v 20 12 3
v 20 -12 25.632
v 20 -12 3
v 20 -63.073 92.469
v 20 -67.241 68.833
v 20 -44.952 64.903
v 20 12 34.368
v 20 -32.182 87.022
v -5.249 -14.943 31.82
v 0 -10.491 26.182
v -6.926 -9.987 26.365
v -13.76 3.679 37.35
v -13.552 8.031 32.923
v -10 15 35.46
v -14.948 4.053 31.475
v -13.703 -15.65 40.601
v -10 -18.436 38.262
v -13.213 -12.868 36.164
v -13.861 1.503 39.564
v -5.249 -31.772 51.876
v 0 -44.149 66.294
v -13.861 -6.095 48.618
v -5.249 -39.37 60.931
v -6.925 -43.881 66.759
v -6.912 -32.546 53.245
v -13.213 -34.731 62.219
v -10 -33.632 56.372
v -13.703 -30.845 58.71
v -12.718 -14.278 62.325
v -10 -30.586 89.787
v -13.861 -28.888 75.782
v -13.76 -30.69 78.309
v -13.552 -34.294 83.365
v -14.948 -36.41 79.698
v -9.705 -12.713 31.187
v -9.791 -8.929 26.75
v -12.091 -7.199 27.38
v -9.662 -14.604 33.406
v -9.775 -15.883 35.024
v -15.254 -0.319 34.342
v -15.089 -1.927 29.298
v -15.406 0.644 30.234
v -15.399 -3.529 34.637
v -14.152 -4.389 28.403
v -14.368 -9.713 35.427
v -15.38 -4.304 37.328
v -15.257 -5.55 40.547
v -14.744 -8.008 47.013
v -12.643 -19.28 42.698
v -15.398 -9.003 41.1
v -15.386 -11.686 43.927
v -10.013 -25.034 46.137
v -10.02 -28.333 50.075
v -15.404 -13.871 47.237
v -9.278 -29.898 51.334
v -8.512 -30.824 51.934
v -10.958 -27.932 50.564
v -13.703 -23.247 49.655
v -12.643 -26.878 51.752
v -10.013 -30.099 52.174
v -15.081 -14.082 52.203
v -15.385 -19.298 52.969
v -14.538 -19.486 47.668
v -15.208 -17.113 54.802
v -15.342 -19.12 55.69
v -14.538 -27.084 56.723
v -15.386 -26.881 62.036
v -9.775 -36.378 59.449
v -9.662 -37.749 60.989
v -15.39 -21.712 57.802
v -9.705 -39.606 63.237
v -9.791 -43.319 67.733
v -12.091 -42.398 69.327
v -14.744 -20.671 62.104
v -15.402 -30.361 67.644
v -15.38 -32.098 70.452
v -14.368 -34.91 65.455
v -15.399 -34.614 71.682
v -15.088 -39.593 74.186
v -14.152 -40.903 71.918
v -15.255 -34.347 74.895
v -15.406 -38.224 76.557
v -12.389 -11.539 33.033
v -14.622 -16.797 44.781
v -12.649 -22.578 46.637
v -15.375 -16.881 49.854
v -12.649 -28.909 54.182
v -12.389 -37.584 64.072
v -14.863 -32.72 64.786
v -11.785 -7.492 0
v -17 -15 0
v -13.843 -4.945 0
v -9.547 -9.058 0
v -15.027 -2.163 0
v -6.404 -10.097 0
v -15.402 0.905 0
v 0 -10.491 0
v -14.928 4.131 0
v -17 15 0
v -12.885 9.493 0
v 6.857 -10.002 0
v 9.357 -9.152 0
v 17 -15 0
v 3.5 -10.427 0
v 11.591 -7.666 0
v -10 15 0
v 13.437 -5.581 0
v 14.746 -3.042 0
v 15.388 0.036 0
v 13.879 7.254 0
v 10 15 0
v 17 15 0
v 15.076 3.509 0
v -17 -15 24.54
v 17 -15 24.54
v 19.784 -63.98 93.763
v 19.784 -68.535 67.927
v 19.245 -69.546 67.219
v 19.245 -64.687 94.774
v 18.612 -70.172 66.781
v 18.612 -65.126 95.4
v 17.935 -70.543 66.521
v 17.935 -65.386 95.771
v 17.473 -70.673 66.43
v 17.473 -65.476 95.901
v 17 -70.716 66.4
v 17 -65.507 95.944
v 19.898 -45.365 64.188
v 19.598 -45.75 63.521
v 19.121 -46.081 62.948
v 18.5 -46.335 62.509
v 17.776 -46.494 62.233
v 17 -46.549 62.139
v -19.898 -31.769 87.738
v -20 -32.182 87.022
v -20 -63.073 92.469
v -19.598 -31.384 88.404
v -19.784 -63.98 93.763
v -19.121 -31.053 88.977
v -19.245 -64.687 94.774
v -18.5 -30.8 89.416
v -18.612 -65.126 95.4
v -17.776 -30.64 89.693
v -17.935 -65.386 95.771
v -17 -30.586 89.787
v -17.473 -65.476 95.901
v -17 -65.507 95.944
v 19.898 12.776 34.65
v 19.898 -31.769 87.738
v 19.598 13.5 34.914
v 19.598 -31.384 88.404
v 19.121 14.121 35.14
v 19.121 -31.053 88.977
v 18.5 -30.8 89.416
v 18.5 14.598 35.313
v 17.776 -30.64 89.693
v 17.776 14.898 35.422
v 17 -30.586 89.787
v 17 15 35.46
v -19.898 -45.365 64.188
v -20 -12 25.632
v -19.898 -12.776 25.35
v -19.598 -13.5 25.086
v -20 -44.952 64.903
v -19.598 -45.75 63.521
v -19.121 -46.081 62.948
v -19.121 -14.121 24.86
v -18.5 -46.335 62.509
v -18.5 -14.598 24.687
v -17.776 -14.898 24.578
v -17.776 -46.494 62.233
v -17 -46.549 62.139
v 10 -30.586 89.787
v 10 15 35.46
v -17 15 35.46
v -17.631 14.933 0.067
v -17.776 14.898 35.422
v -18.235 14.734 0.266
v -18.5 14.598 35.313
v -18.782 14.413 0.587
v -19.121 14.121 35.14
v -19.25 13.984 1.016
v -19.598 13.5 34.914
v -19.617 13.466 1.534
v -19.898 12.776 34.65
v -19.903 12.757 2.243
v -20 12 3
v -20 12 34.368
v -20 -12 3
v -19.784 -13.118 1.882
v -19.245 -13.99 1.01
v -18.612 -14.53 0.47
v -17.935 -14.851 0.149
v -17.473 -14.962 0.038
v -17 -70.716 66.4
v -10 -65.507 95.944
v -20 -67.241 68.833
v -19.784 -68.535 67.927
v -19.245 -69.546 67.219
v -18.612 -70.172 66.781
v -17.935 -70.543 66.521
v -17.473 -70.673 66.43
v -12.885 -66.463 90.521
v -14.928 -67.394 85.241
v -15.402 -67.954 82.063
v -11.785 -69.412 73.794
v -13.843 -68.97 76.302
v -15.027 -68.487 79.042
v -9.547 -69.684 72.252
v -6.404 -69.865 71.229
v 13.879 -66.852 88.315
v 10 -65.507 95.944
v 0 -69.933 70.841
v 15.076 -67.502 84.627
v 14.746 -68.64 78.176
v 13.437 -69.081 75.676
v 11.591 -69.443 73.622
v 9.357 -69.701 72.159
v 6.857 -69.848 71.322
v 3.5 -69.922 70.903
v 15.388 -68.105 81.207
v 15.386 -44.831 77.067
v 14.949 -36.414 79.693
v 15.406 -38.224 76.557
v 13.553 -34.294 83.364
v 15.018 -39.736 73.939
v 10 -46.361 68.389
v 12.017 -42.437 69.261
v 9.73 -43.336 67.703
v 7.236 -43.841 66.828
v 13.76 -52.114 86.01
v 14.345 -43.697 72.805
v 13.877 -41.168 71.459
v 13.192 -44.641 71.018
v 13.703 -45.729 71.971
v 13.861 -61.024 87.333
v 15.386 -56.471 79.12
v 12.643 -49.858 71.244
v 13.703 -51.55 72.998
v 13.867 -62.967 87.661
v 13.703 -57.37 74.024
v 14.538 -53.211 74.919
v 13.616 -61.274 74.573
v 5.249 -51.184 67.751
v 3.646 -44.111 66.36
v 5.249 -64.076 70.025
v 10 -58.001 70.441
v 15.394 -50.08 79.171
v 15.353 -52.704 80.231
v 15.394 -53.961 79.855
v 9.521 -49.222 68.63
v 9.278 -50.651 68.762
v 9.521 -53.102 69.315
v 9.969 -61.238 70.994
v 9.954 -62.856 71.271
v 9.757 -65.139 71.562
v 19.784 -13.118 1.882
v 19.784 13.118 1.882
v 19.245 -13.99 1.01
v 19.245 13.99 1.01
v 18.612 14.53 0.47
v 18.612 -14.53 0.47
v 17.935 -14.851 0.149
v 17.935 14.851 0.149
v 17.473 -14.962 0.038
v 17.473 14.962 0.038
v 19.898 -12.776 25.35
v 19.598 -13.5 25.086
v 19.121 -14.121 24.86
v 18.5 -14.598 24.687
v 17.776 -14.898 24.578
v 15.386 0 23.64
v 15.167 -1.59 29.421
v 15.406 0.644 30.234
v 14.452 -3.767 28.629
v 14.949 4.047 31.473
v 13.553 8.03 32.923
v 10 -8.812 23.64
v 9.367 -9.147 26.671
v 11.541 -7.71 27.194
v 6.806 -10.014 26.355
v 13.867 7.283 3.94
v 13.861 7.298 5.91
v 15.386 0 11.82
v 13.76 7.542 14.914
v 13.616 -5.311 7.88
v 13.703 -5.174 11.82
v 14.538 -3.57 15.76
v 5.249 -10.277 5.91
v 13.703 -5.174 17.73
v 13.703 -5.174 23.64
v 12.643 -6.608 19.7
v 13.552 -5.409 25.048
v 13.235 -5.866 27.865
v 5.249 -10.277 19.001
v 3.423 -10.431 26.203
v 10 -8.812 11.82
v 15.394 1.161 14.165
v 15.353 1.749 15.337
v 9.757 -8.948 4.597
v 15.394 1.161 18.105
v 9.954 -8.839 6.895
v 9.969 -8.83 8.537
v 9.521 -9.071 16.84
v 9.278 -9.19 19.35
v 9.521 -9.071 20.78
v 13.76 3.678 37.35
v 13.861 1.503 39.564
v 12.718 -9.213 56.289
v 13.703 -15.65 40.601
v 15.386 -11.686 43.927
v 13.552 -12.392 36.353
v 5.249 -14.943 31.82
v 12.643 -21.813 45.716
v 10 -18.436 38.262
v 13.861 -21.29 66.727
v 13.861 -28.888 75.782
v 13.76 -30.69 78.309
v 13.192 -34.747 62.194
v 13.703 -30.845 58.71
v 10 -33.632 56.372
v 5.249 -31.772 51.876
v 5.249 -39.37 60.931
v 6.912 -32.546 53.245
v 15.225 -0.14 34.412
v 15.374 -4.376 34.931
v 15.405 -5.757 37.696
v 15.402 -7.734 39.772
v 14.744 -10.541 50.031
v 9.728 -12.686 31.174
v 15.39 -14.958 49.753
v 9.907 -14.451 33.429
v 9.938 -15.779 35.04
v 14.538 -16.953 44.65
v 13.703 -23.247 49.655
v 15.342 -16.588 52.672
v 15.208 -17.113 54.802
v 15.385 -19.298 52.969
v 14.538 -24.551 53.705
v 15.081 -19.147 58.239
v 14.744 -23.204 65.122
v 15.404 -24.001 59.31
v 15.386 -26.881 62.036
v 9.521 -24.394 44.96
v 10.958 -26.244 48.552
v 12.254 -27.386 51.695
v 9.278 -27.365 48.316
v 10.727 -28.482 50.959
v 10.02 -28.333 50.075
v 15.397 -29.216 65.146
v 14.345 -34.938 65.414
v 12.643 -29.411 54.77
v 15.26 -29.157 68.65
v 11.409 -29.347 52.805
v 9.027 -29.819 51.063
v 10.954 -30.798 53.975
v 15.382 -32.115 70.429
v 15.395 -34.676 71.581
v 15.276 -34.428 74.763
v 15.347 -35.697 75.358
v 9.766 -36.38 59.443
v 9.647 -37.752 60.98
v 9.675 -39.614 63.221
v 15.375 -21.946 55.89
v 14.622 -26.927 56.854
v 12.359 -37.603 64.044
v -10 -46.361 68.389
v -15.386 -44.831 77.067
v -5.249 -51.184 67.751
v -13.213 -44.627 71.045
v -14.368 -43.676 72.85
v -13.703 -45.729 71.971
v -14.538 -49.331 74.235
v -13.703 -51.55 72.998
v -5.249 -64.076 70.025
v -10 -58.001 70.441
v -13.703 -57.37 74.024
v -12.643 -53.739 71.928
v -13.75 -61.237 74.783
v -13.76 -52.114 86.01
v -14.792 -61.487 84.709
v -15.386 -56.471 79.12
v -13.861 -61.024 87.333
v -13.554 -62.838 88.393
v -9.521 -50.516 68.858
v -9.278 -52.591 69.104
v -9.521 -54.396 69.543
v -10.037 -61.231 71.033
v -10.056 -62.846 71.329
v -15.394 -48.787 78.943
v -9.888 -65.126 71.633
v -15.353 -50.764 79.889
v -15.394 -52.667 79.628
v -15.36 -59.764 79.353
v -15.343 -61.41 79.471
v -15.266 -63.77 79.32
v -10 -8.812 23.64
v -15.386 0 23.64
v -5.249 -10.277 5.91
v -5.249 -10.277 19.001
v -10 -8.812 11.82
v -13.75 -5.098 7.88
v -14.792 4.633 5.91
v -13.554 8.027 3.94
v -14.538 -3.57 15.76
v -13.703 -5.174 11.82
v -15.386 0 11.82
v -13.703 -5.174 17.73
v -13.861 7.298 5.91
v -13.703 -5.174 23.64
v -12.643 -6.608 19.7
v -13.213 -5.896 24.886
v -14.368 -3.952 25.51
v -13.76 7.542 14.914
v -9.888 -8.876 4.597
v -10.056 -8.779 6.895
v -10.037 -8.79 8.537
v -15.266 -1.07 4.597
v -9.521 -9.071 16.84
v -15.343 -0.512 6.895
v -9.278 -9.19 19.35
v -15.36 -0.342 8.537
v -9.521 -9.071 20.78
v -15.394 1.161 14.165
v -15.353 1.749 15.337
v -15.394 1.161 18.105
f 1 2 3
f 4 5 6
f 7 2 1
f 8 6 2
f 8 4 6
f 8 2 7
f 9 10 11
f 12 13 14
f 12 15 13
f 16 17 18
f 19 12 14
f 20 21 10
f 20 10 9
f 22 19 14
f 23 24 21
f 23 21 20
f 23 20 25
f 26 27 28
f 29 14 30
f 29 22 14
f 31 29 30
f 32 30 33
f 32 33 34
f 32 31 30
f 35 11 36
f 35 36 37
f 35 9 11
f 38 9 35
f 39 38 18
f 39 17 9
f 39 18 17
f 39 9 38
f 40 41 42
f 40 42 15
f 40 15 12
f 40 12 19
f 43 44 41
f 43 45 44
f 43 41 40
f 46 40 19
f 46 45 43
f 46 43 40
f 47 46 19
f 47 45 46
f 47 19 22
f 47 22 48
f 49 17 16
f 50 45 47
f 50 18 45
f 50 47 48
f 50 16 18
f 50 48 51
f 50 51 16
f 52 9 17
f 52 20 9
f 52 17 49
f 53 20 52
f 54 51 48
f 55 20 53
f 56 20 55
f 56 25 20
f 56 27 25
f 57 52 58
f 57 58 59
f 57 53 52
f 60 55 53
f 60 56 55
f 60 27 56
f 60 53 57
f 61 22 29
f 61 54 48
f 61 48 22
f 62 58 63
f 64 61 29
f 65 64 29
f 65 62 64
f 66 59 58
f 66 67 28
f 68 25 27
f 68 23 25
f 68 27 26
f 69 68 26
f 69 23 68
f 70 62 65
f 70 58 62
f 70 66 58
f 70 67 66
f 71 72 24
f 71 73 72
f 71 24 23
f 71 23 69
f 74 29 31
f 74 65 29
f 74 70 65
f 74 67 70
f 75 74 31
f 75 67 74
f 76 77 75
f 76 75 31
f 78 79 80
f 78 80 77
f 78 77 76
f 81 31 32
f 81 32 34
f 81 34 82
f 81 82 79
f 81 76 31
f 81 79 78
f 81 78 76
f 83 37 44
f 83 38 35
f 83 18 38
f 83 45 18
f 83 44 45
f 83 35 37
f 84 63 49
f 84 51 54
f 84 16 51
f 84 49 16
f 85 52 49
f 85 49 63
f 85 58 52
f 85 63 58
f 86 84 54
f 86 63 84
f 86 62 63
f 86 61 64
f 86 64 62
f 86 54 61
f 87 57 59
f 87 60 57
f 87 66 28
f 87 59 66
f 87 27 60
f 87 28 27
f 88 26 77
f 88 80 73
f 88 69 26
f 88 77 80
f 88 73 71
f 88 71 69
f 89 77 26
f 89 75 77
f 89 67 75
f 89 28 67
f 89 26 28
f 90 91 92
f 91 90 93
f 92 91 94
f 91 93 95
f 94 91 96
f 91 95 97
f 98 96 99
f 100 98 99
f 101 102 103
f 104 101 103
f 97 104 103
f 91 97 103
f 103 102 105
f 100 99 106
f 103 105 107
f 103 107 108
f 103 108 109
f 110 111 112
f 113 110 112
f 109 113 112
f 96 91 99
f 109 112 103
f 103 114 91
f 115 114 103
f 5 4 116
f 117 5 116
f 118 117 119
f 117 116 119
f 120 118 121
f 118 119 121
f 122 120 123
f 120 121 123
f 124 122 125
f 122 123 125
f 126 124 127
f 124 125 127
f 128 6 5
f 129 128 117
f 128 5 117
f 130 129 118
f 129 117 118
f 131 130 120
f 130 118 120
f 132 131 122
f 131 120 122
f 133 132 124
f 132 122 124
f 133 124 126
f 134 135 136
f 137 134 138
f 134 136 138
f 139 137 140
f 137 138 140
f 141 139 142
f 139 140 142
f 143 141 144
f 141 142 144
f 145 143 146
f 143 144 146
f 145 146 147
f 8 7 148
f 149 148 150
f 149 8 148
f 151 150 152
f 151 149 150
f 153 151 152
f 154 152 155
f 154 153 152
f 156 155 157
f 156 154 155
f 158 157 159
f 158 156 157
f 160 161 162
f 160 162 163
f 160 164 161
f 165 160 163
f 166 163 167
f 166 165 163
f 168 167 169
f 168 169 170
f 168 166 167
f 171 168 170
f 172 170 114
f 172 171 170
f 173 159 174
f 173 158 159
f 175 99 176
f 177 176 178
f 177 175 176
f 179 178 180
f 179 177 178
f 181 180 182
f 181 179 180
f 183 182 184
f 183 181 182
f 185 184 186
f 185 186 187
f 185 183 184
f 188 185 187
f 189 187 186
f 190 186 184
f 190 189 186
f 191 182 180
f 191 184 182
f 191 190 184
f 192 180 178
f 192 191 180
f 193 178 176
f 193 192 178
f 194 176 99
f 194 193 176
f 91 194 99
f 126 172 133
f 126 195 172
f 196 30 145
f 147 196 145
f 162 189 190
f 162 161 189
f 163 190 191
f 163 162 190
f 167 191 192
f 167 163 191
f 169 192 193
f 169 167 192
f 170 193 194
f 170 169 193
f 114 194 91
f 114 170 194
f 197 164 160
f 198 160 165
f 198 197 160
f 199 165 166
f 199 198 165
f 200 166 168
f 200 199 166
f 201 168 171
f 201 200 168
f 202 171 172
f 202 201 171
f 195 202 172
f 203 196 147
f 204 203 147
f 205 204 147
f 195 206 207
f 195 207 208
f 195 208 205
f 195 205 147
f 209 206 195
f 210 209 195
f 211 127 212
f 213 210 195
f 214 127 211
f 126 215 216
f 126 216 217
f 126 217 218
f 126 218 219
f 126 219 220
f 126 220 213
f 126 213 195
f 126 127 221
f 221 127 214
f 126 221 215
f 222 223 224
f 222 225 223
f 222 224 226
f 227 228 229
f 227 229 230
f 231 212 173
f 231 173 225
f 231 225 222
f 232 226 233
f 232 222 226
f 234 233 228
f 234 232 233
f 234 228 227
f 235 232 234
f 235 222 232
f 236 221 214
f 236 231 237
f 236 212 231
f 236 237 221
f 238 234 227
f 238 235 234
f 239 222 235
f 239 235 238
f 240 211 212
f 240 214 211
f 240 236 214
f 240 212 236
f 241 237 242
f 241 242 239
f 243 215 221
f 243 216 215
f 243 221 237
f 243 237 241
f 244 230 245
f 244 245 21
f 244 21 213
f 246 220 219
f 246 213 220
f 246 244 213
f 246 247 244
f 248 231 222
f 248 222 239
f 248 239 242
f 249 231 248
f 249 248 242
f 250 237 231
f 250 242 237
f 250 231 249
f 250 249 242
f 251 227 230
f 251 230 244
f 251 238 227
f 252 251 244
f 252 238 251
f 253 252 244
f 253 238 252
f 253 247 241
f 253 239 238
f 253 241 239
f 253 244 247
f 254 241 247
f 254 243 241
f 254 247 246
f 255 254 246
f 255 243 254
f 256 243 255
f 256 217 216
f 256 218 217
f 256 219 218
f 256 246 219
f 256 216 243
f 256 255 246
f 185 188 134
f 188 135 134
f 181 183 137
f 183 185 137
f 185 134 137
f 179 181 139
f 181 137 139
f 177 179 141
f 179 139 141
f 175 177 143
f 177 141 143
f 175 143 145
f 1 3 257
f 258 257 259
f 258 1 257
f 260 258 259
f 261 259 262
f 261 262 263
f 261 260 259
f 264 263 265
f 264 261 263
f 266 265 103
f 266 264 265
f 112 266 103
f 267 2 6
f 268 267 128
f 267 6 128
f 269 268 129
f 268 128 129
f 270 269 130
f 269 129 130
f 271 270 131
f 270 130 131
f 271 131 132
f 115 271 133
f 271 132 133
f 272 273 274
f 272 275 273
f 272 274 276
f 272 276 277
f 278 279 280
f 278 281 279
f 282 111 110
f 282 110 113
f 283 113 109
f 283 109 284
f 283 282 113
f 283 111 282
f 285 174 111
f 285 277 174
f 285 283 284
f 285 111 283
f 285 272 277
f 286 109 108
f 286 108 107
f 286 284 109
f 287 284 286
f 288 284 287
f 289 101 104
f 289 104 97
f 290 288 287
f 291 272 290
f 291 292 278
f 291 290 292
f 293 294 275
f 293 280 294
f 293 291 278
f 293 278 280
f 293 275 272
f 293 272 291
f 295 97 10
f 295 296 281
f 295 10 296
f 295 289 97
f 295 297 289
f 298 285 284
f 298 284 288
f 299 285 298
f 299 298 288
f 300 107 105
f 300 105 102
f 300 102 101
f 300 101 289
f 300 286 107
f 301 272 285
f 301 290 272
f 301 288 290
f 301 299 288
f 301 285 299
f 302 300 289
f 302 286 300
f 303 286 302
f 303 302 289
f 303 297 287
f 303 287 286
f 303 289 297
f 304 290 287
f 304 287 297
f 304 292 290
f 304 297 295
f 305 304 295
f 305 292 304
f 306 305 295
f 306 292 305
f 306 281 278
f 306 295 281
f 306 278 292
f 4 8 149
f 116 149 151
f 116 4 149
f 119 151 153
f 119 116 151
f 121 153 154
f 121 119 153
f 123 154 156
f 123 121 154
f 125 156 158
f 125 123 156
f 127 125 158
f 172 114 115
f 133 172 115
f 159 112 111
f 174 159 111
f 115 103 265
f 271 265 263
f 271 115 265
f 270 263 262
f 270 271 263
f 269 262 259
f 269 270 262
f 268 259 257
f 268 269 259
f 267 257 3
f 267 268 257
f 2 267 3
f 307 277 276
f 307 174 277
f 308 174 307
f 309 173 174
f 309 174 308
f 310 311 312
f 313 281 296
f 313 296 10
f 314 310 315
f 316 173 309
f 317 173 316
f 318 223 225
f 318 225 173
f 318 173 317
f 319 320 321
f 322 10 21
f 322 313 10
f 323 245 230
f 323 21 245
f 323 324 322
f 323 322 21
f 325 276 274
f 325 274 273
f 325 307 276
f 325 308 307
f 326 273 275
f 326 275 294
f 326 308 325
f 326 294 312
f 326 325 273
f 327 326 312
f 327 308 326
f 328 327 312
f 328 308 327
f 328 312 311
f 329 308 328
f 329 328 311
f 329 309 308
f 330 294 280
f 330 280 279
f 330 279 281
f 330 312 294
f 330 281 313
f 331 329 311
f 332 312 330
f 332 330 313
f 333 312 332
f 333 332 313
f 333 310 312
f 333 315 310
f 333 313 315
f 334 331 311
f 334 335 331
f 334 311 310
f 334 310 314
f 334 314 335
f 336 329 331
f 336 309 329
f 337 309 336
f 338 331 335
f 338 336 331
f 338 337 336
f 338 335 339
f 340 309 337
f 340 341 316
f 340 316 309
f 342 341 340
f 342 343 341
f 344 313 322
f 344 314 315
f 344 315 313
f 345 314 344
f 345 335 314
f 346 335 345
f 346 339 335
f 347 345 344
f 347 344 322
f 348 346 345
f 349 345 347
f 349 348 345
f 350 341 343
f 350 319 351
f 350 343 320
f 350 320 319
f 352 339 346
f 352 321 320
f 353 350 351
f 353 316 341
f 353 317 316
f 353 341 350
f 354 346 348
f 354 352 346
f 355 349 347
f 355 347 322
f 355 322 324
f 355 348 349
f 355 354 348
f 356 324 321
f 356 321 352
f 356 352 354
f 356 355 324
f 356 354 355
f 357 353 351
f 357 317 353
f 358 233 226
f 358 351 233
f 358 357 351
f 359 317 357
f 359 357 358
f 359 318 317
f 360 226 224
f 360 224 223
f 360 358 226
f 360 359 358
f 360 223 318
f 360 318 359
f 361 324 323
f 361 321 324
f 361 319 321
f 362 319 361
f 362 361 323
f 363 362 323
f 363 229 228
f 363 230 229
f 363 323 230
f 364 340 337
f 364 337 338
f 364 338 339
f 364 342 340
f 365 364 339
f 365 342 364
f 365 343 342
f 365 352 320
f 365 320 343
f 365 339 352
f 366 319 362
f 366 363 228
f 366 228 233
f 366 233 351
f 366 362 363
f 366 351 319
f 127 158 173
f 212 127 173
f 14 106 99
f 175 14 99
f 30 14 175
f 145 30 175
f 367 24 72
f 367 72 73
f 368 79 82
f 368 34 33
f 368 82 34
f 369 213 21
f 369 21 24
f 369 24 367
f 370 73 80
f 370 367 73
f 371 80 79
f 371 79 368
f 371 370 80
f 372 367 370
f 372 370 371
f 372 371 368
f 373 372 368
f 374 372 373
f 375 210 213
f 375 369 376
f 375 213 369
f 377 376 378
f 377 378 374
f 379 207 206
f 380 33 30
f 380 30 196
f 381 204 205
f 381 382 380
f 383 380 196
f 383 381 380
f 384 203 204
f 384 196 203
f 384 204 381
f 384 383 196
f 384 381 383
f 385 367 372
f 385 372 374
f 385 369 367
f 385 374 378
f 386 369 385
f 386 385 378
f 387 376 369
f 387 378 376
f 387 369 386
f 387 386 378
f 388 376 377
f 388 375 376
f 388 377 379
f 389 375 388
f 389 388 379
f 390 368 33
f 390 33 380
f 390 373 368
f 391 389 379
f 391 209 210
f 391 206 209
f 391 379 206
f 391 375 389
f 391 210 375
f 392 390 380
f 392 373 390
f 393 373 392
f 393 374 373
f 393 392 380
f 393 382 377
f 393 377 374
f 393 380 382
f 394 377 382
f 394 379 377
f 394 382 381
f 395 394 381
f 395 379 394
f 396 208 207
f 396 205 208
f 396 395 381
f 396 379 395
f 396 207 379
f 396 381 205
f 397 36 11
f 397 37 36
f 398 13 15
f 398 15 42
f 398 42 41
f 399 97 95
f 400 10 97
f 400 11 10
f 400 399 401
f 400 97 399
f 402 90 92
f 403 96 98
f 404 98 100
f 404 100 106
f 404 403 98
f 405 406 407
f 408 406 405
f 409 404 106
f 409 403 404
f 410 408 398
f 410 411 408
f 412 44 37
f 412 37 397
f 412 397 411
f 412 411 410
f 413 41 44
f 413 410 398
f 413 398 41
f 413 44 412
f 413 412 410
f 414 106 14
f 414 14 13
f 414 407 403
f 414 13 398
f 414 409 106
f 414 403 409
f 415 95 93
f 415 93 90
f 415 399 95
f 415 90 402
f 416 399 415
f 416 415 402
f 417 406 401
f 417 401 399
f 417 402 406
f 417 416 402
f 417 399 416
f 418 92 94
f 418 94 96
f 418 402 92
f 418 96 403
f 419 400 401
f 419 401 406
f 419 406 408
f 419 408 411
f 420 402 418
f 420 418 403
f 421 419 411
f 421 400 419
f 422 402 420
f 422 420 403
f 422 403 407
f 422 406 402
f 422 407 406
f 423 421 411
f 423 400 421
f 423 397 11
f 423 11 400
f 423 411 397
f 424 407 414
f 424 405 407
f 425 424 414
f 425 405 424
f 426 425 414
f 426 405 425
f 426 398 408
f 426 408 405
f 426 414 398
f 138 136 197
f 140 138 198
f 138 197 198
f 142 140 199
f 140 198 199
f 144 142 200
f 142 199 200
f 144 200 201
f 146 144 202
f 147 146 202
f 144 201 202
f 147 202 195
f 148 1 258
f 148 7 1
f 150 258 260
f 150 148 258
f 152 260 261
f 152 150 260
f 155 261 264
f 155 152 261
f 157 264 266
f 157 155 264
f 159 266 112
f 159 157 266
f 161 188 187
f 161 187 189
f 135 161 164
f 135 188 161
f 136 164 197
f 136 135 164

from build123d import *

# Parameters (mm, degrees)
F3_R = 3


with BuildPart() as f2:
    # F2: sweep along a path in F1
    with BuildLine(Plane.YZ) as f2_path:
        Line((0, 0), (0, 30))
        Line((0, 30), (-38.5672565812, 75.9626665871))
        Line((-38.5672565812, 75.9626665871), (-68.1114891716, 81.1721119171))
    # F0 (on Top) → F2 (sweep)
    with BuildSketch(Plane.XY):
        with BuildLine():
            Line((-10, 15), (-20, 15))
            Line((-20, 15), (-20, -15))
            Line((-20, -15), (20, -15))
            Line((20, -15), (20, 15))
            Line((20, 15), (10, 15))
            add(Edge.make_bspline(
                [(10, 15), (12.8331761755, 9.8207678803), (17.947046752, 0.4722766093), (10.6957463234, -10.4813852615), (3.5543120142, -10.4875882246), (0, -10.4906754568)],
                knots=[0, 0, 0, 0, 0.3842269917, 0.6935280356, 1, 1, 1, 1], degree=3))
            add(Edge.make_bspline(
                [(-10, 15), (-12.8331761755, 9.8207678803), (-17.947046752, 0.4722766093), (-10.6957463234, -10.4813852615), (-3.5543120142, -10.4875882246), (0, -10.4906754568)],
                knots=[0, 0, 0, 0, 0.3842269917, 0.6935280356, 1, 1, 1, 1], degree=3))
        make_face()
    sweep(path=f2_path.line, transition=Transition.RIGHT)

    # F3
    f3_edges = [f2.edges().sort_by_distance(p)[0] for p in [
        (-20, 15, 17.729777),
        (-20, -7.792962, 62.623147),
        (-20, -48.046345, 92.865485),
        (-20, -68.111489, 81.172112),
        (-20, -58.632401, 64.269294),
        (-20, -30.774295, 43.339519),
        (-20, -15, 12.270223),
        (-20, 0, 0),
        (20, -48.046345, 92.865485),
        (20, -7.792962, 62.623147),
        (20, 15, 17.729777),
        (20, 0, 0),
        (20, -15, 12.270223),
        (20, -30.774295, 43.339519),
        (20, -58.632401, 64.269294),
        (20, -68.111489, 81.172112),
    ]]
    fillet(f3_edges, radius=F3_R)


solid = f2.part
